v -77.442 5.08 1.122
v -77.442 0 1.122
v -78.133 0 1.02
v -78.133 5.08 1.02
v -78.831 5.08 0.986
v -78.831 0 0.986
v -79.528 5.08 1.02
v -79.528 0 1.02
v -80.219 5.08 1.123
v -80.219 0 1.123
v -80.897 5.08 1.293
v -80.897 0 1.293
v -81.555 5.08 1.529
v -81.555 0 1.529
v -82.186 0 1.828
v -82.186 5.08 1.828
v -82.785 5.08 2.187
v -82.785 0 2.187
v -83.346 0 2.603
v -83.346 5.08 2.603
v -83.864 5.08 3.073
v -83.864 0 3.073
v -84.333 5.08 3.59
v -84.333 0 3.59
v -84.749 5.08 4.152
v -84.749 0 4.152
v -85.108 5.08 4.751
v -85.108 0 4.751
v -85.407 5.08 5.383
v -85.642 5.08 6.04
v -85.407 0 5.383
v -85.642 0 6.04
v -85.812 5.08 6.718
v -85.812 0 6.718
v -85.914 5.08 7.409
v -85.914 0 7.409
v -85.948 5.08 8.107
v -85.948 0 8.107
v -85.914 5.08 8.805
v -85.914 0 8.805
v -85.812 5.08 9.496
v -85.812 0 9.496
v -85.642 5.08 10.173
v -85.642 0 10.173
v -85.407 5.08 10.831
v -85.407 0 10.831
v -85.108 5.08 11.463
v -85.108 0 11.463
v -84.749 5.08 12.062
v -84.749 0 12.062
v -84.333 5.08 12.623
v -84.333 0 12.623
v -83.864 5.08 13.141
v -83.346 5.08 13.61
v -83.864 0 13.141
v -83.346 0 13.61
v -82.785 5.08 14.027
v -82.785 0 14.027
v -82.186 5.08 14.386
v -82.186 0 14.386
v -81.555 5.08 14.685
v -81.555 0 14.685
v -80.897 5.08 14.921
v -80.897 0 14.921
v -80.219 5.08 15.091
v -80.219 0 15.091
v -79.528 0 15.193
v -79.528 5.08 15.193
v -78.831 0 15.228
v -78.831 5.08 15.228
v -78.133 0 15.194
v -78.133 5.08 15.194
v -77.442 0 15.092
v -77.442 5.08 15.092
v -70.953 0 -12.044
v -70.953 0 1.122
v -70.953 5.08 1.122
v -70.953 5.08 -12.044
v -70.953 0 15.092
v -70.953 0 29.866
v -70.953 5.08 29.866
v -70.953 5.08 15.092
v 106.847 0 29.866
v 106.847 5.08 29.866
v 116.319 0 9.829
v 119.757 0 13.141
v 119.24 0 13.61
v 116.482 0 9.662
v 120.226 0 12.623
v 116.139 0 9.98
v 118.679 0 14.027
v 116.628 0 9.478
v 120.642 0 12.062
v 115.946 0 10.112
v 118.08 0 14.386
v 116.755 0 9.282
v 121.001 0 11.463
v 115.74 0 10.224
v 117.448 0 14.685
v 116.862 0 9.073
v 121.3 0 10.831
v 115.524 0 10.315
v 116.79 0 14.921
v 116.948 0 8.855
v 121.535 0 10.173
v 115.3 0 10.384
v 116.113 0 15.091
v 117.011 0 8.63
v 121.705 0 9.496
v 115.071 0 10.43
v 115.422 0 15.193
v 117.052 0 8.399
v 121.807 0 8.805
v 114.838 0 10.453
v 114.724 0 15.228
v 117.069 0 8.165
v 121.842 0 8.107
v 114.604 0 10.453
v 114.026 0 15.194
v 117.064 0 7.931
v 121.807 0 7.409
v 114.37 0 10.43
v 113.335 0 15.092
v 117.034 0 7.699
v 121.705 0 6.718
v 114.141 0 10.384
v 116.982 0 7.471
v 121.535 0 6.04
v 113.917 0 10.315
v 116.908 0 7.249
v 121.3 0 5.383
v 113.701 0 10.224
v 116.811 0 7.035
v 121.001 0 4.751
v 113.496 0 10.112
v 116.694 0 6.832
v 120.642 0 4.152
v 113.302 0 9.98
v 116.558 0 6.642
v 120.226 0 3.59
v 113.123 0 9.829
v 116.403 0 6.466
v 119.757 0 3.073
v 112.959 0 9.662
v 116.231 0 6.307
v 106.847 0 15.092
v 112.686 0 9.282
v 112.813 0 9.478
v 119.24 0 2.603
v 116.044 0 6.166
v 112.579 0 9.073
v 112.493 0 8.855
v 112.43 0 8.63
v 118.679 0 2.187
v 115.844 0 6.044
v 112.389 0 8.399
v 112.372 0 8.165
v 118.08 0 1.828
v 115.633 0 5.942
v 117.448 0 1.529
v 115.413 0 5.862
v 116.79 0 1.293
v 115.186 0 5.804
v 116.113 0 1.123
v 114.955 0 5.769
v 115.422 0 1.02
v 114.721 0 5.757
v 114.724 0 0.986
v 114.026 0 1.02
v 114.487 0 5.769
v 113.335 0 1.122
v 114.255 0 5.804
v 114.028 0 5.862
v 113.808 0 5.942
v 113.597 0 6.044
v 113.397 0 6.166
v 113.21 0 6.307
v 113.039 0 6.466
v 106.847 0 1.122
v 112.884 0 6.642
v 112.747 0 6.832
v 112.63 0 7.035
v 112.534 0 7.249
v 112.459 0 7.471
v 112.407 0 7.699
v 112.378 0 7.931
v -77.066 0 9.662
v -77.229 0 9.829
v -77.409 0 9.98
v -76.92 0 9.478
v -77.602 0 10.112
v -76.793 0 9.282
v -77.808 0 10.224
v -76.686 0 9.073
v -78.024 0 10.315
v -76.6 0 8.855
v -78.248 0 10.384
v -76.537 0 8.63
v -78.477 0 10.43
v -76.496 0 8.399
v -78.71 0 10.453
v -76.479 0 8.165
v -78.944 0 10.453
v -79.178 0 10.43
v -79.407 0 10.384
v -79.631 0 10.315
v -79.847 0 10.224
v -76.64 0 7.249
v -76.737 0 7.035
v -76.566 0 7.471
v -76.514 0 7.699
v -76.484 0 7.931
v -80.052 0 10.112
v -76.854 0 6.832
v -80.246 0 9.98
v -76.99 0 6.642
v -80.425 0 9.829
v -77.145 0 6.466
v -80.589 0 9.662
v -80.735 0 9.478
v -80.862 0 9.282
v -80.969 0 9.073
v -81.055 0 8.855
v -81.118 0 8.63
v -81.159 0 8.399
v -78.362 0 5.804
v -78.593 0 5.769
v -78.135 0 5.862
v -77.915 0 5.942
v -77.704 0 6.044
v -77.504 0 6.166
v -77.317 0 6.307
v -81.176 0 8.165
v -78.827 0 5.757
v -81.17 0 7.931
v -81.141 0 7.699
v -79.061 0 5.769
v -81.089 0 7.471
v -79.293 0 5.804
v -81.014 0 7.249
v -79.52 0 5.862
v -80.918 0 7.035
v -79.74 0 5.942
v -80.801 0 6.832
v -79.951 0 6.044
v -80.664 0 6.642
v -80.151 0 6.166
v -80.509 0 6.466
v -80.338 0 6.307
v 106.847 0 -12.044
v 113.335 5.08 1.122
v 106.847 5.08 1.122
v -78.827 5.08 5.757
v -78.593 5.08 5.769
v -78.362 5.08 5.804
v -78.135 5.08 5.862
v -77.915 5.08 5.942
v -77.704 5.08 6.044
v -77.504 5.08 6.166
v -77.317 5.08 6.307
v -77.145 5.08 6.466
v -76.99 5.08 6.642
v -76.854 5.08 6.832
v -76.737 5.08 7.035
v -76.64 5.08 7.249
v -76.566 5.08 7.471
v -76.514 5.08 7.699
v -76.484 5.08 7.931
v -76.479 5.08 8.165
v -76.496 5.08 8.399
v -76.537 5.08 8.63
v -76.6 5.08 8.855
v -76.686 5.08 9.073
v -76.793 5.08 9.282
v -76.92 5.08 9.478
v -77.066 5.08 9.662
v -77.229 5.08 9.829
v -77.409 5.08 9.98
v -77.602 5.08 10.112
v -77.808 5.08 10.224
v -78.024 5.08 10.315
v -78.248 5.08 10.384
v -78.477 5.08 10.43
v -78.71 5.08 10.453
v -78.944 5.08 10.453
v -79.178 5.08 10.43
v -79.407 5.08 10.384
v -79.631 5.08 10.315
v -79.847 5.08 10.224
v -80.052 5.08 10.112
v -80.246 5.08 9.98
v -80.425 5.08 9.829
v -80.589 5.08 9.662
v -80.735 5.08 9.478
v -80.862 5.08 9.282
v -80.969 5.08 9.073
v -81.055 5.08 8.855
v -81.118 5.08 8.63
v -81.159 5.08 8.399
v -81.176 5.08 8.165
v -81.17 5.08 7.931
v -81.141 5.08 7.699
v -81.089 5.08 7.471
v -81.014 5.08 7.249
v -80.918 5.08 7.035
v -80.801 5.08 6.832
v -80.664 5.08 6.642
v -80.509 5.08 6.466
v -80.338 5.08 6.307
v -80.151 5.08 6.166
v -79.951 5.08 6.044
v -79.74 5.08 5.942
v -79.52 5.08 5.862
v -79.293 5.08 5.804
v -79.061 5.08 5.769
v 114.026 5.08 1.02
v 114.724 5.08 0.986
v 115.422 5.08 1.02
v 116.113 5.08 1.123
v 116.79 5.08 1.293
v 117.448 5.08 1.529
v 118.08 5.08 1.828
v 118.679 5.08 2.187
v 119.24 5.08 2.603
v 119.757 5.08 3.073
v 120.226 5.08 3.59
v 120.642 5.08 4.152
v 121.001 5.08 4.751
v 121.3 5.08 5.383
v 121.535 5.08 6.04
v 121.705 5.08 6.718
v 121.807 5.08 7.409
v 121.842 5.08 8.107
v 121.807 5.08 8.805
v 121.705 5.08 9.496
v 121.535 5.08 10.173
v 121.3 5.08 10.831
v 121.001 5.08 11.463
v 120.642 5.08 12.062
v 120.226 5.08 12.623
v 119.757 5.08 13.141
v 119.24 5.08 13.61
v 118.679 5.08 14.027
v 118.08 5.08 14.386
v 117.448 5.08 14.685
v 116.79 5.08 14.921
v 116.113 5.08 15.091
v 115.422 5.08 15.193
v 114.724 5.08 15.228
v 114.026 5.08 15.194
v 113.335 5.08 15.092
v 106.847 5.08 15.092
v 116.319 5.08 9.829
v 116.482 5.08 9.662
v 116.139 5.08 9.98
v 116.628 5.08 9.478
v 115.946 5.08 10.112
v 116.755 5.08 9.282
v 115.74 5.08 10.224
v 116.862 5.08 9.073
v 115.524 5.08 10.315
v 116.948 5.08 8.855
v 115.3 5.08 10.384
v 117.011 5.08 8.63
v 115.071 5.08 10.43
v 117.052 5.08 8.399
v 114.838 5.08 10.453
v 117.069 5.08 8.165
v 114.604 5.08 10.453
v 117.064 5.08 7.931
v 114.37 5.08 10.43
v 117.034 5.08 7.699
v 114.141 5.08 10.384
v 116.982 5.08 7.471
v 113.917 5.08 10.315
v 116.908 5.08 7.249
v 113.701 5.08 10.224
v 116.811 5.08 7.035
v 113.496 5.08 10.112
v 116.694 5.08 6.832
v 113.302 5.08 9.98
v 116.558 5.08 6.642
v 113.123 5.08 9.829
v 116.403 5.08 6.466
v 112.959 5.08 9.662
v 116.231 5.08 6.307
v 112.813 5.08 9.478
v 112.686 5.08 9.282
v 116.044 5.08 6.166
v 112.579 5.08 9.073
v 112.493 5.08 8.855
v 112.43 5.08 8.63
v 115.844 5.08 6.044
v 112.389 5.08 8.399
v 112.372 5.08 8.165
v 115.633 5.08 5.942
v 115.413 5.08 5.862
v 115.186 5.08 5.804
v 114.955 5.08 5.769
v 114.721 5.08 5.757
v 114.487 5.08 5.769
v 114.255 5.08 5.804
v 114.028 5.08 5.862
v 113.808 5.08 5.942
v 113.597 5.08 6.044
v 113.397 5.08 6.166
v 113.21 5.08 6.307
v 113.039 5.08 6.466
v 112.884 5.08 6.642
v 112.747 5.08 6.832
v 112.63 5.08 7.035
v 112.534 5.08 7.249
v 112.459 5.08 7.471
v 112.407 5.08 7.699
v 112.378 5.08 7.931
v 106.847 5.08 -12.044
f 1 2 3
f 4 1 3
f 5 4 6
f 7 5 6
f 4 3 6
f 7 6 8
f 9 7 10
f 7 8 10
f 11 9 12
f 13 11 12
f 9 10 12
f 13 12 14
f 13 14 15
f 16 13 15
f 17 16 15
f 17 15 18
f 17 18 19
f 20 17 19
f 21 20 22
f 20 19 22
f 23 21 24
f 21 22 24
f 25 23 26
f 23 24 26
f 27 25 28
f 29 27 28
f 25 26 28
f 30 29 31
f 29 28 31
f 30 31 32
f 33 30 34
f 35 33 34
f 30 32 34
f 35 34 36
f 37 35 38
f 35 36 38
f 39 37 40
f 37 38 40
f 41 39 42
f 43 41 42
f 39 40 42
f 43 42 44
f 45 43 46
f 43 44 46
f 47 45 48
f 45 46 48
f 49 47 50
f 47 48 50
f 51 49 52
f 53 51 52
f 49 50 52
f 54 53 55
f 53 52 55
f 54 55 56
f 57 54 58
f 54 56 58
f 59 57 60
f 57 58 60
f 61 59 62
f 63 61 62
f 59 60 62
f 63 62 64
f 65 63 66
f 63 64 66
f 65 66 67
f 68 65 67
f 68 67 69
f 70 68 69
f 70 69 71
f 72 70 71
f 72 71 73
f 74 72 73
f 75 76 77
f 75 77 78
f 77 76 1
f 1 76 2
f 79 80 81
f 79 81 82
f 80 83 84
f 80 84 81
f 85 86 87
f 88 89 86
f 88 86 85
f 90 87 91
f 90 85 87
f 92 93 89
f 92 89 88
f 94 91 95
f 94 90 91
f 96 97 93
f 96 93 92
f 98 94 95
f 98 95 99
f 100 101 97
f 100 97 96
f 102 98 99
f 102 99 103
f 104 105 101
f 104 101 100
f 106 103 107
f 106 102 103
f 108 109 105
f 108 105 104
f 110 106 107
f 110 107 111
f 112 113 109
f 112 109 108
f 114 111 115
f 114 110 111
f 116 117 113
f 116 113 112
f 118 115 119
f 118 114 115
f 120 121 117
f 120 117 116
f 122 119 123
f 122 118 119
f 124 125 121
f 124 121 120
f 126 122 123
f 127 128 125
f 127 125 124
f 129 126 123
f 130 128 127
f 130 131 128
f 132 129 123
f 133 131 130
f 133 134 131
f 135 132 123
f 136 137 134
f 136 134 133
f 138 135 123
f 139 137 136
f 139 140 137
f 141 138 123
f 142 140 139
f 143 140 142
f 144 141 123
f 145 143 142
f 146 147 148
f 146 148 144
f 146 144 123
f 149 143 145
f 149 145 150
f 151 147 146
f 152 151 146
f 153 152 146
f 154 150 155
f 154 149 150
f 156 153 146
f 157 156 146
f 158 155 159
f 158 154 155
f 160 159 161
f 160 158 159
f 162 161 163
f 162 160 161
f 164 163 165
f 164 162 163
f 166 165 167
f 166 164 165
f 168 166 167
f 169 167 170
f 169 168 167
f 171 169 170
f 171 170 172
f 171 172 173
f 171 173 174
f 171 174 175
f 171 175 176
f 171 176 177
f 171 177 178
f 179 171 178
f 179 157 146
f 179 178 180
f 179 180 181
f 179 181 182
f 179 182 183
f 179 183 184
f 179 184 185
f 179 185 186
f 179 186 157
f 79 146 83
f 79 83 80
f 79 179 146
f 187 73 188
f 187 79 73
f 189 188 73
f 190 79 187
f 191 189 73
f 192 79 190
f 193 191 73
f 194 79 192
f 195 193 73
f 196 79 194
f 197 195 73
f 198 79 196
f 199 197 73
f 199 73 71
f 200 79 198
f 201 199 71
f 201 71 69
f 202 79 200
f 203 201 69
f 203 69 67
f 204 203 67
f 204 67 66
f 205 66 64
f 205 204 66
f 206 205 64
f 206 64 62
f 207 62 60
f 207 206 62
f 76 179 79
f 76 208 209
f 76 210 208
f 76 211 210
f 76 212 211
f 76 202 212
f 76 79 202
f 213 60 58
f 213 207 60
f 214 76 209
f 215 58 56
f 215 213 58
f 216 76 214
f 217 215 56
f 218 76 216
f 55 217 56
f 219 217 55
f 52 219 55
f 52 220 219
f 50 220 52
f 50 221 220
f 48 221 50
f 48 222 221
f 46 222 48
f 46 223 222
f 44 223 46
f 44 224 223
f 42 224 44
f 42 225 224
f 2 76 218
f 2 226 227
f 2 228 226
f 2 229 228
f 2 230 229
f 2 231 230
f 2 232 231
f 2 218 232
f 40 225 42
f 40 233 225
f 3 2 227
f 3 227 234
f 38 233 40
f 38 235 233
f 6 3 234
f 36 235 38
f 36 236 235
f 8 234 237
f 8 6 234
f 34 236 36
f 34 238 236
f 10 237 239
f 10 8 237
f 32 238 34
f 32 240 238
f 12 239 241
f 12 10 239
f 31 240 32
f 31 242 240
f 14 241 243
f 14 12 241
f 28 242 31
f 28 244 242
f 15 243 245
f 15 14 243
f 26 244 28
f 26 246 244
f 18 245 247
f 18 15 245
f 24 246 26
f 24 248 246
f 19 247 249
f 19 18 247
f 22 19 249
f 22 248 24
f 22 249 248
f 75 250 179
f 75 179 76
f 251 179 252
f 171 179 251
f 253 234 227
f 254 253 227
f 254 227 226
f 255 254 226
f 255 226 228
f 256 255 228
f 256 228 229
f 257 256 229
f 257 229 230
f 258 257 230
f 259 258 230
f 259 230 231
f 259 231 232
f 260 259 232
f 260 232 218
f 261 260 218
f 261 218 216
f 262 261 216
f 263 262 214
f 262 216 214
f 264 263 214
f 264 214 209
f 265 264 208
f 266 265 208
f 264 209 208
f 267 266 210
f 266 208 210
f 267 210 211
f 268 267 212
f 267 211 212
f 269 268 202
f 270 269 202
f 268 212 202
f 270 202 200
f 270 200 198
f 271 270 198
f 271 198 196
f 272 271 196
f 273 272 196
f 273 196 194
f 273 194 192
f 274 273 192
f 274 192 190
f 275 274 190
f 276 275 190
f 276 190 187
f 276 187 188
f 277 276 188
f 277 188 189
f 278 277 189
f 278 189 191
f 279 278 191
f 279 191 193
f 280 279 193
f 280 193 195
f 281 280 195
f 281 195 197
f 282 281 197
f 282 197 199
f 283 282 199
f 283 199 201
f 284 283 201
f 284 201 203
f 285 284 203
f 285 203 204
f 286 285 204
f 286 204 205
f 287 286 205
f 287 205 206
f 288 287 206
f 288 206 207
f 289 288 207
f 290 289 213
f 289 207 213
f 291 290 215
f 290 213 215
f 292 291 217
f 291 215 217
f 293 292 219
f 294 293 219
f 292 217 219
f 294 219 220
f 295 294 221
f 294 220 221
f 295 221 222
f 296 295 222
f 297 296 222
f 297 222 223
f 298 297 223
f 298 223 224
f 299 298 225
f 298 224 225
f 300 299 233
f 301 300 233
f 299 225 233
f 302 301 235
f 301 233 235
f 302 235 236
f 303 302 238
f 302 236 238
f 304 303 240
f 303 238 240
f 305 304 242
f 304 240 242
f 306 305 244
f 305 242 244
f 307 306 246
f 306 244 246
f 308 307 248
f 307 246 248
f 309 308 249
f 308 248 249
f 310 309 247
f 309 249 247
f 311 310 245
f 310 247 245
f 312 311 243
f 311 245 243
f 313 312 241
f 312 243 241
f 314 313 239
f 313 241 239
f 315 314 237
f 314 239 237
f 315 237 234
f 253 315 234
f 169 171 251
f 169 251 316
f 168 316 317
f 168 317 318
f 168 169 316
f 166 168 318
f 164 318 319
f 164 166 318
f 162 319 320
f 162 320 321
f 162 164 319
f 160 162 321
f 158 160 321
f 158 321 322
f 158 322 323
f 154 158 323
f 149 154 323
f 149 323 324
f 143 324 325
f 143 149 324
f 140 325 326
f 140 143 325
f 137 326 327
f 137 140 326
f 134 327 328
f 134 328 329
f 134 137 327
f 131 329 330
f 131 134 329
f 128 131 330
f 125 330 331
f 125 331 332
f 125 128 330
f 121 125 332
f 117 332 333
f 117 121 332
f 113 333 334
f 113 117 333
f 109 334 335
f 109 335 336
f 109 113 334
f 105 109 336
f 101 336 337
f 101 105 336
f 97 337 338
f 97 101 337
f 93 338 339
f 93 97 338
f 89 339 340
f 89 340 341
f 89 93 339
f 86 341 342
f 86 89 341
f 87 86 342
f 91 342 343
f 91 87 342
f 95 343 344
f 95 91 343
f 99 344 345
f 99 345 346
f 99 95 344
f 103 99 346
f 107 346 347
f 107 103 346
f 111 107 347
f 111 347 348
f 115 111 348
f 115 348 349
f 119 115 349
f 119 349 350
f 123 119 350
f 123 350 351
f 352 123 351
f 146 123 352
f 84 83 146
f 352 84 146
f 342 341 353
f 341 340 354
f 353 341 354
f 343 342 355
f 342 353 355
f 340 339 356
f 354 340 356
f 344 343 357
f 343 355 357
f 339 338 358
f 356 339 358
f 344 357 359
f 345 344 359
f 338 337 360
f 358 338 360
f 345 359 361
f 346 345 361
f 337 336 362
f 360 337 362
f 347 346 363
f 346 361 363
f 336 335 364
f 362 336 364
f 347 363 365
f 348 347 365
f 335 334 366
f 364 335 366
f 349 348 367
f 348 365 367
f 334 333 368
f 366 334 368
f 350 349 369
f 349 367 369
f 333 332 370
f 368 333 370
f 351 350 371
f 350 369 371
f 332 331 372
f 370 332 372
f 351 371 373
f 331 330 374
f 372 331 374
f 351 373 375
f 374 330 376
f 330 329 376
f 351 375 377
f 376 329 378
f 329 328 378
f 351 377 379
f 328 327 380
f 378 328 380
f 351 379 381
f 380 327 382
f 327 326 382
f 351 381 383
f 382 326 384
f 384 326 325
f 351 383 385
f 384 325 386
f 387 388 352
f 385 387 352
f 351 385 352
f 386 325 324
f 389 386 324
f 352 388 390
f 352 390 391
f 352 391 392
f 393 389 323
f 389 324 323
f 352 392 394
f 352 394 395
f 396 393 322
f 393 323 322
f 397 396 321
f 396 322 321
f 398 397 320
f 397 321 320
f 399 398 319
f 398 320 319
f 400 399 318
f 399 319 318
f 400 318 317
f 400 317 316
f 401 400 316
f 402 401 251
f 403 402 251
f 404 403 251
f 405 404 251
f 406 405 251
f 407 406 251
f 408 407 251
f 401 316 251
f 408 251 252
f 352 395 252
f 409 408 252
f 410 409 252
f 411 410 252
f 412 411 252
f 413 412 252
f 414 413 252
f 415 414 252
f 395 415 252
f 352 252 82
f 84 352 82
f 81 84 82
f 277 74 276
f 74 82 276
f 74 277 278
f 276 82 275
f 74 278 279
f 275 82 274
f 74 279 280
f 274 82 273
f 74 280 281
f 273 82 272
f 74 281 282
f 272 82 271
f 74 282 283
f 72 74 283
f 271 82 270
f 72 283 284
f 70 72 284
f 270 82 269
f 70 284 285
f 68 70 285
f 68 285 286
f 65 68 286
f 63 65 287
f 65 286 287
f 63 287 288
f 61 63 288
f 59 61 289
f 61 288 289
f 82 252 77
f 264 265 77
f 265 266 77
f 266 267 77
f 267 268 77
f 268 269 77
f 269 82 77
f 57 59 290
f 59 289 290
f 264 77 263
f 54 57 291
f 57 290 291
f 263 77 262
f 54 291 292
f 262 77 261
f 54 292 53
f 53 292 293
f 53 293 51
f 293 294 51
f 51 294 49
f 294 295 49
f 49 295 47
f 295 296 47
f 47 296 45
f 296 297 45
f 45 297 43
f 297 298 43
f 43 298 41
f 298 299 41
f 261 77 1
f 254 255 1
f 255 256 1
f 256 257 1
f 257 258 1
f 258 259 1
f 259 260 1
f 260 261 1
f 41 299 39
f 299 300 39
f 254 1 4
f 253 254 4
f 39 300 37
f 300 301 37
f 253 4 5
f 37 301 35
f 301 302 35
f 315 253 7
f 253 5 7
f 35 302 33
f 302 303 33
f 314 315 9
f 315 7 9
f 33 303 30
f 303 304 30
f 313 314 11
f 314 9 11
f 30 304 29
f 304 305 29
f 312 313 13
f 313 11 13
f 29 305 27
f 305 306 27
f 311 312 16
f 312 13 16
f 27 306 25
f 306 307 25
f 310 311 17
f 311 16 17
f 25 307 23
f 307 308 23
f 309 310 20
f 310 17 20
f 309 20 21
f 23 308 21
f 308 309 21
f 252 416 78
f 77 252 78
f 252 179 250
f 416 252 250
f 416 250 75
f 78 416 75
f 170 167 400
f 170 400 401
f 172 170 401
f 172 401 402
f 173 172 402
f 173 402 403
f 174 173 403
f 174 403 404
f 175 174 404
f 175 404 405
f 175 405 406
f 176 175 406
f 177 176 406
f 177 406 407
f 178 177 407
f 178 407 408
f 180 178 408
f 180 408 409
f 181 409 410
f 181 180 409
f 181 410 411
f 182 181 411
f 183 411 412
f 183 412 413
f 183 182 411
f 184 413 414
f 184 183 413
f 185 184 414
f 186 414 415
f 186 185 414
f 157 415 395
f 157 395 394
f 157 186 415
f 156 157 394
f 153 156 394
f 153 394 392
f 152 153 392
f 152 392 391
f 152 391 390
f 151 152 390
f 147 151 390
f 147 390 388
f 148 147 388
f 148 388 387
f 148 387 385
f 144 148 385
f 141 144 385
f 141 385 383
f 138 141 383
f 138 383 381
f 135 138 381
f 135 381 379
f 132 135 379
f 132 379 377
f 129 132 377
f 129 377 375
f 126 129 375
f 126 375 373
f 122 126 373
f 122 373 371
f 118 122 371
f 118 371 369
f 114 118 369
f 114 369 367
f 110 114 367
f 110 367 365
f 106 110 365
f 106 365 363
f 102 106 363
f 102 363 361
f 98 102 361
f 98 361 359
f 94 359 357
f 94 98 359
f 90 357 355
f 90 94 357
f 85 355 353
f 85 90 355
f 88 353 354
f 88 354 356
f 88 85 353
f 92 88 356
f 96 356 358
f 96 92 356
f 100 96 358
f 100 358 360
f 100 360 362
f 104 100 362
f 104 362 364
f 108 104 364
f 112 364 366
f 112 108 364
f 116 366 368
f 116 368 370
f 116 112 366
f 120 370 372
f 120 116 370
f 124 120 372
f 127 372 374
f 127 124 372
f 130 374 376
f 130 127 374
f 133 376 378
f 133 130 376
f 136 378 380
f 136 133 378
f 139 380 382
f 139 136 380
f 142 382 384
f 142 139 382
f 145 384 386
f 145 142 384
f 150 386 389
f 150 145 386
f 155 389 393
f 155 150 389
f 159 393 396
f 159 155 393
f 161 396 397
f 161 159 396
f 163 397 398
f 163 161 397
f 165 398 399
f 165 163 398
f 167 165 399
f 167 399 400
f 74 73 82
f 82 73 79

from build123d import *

# Parameters (mm, degrees)
SKETCH1_W           = 88.9
SKETCH1_H           = 41.91
BOSS_EXTRUDE1_DEPTH = 5.08
CUT_EXTRUDE1_REACH  = 93.131
SKETCH2_R           = 2.3495


with BuildPart() as part:
    # Sketch1 → Boss-Extrude1 (new body)
    with BuildSketch(Plane(origin=(0, 0, 0), x_dir=(1, 0, 0), z_dir=(0, 1, 0))):
        with BuildLine():
            ThreePointArc((-77.441755774, -1.121902455), (-85.948469046, -8.106902455), (-77.441755774, -15.091902455))
            Line((-77.441755774, -15.091902455), (-78.827364113, -15.091902455))
            Line((-78.827364113, -15.091902455), (-78.827364113, -1.121902455))
            Line((-78.827364113, -1.121902455), (-77.441755774, -1.121902455))
        make_face()
        with BuildLine():
            Line((-78.827364113, -15.091902455), (-77.441755774, -15.091902455))
            ThreePointArc((-77.441755774, -15.091902455), (-73.323856239, -12.625921878), (-71.70625918, -8.106902455))
            ThreePointArc((-71.70625918, -8.106902455), (-73.323856239, -3.587883032), (-77.441755774, -1.121902455))
            Line((-77.441755774, -1.121902455), (-78.827364113, -1.121902455))
            Line((-78.827364113, -1.121902455), (-78.827364113, -15.091902455))
        make_face()
        with BuildLine():
            Line((-77.441755774, -15.091902455), (-70.953364113, -15.091902455))
            Line((-70.953364113, -15.091902455), (-70.953364113, -1.121902455))
            Line((-70.953364113, -1.121902455), (-77.441755774, -1.121902455))
            ThreePointArc((-77.441755774, -1.121902455), (-73.323856239, -3.587883032), (-71.70625918, -8.106902455))
            ThreePointArc((-71.70625918, -8.106902455), (-73.323856239, -12.625921878), (-77.441755774, -15.091902455))
        make_face()
        with Locations((-26.503364113, -8.911027969)):
            Rectangle(SKETCH1_W, SKETCH1_H)
    boss_extrude1 = extrude(amount=BOSS_EXTRUDE1_DEPTH)

    # Sketch2 → Cut-Extrude1 (cut, up to next)
    with BuildSketch(Plane(origin=(0, 0, 0), x_dir=(-1, 0, 0), z_dir=(0, -1, 0)), mode=Mode.PRIVATE) as cut_extrude1_sk1:
        with Locations(Location((78.827364113, -8.106902455, 0), (0, 0, 90))):
            Circle(SKETCH2_R)
    cut_extrude1_tool1 = extrude(cut_extrude1_sk1.sketch, amount=-CUT_EXTRUDE1_REACH, mode=Mode.PRIVATE) & part.part
    cut_extrude1 = cut_extrude1_tool1.solids().sort_by_distance((-78.827364, 0, 8.106902))[0]
    add(cut_extrude1, mode=Mode.SUBTRACT)

    # Mirror2: Boss-Extrude1, Cut-Extrude1 across plane
    add(boss_extrude1.mirror(Plane(origin=(17.946635887, 5.08, 0), x_dir=(0, 0, 1), z_dir=(-1, 0, 0))))
    add(cut_extrude1.mirror(Plane(origin=(17.946635887, 5.08, 0), x_dir=(0, 0, 1), z_dir=(-1, 0, 0))), mode=Mode.SUBTRACT)


solid = part.part
